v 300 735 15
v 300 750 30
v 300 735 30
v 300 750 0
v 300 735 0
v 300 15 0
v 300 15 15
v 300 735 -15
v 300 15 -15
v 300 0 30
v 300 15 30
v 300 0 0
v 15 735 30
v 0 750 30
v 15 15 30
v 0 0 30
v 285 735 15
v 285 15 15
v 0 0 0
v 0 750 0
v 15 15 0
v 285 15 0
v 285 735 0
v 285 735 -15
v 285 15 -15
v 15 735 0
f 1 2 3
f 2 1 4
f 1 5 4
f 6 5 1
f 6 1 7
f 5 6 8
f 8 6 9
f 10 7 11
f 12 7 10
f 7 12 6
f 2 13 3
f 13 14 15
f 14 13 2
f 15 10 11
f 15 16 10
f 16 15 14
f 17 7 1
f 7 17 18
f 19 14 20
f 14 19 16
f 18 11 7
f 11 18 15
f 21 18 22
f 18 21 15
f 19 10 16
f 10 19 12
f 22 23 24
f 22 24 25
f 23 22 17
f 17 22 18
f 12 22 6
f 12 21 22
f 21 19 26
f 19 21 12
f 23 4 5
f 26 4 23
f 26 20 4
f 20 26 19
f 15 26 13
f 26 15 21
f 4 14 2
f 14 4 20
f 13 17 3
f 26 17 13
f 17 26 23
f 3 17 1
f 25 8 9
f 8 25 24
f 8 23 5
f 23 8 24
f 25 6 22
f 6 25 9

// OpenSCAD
// file: frame.scad
module frame_short(height, thickness, width, depth){
    color("#9b815f"){
    //upper
    translate([0, 0, height/2])
    cube([width, thickness, height/2]);
    //lower
    translate([thickness, 0, 0])
    cube([width - 2*thickness, thickness, height/2]);
    }
}

module frame_long_upper(height, thickness, width, depth) {
    color("#6f5c44"){
    translate([thickness, thickness, height/2])
    rotate([0, 0, 90])
    cube([depth - 2*thickness, thickness, height/2]);
    }
}
module frame_long_lower(height, thickness, width, depth) {
    color("#6f5c44"){
    translate([thickness,0,0])
    rotate([0,0,90])
    cube([depth, thickness, height/2]);
    }
}
module frame_long(height, thickness, width, depth){
    frame_long_upper(height, thickness, width, depth);
    frame_long_lower(height, thickness, width, depth);
}

module frame(height, thickness, width, depth){
    // front
    frame_short(height, thickness, width, depth);
    
    // back
    translate([0,depth-thickness,0])
    frame_short(height, thickness, width, depth);

    //left 
    frame_long(height, thickness, width, depth);
    
    //right
    translate([width-thickness,0,height/2])
    mirror([0,0,1])
    frame_long(height, thickness, width, depth);
}
// file: grid.scad
// way to complex for my pc, so maybe i come up
// with an more efficient way...
module _mesh(grid, thick, width, depth) {
    rotate([-90,0,0]) {
        for (x=[0:2*thick+grid:width]) {
            translate([x,0,0])
            cube([thick, thick, depth]);
        }
       for (y=[0:2*thick+grid:depth]) {
            rotate([0,-90,0])
            translate([y,0,-width])
            cube([thick, thick, width]);
        }
    }
}

// temp solution, just a plate
module mesh(grid, thick, width, depth) {
    cube([
        width, 
        depth, 
        thick
    ]);
}
// main file
include<grid.scad>
include<frame.scad>

$render_fully_assembled = true;
$render_mesh = false;
$render_all_parts_seperated = false;

$preview = true;
$fn = $preview ? 1 : 64;

$framewidth = 15;
$frameheight = 30; 
$width = 300;
$depth = 750;
$gridsize = 0.125;
$wirediameter = 0.125 / 2;
$gridcolor = "#a0a0a0";

module parts(){
    frame_short(
        $frameheight, 
        $framewidth, 
        $width, 
        $depth
    );
    
    translate([0, 0, $frameheight*2])
    frame_short(
        $frameheight, 
        $framewidth, 
        $width, 
        $depth
    );
    
    translate([$depth, 0, 0])
    rotate([0, 0, 90])
    translate([0, 0, $frameheight*4])
    frame_long(
        $frameheight, 
        $framewidth, 
        $width, 
        $depth
    );
    
    translate([$depth, 0, 0])
    rotate([0, 0, 90])
    translate([0, 0, $frameheight*5.5])
    frame_long_upper(
        $frameheight, 
        $framewidth, 
        $width, 
        $depth
    );
    
    translate([$depth, 0, 0])
    rotate([0, 0, 90])
    translate([0, 0, $frameheight*7])
    frame_long_lower(
        $frameheight, 
        $framewidth, 
        $width, 
        $depth
    );
}

if ($render_fully_assembled) {
    frame(
        $frameheight, 
        $framewidth, 
        $width, $depth
    );
} else if ($render_all_parts_seperated) {
    parts();
}

if ($render_mesh) {
    color($gridcolor)
    mesh(
        $gridsize, 
        $wirediameter, 
        $width, 
        $depth
    );
}
